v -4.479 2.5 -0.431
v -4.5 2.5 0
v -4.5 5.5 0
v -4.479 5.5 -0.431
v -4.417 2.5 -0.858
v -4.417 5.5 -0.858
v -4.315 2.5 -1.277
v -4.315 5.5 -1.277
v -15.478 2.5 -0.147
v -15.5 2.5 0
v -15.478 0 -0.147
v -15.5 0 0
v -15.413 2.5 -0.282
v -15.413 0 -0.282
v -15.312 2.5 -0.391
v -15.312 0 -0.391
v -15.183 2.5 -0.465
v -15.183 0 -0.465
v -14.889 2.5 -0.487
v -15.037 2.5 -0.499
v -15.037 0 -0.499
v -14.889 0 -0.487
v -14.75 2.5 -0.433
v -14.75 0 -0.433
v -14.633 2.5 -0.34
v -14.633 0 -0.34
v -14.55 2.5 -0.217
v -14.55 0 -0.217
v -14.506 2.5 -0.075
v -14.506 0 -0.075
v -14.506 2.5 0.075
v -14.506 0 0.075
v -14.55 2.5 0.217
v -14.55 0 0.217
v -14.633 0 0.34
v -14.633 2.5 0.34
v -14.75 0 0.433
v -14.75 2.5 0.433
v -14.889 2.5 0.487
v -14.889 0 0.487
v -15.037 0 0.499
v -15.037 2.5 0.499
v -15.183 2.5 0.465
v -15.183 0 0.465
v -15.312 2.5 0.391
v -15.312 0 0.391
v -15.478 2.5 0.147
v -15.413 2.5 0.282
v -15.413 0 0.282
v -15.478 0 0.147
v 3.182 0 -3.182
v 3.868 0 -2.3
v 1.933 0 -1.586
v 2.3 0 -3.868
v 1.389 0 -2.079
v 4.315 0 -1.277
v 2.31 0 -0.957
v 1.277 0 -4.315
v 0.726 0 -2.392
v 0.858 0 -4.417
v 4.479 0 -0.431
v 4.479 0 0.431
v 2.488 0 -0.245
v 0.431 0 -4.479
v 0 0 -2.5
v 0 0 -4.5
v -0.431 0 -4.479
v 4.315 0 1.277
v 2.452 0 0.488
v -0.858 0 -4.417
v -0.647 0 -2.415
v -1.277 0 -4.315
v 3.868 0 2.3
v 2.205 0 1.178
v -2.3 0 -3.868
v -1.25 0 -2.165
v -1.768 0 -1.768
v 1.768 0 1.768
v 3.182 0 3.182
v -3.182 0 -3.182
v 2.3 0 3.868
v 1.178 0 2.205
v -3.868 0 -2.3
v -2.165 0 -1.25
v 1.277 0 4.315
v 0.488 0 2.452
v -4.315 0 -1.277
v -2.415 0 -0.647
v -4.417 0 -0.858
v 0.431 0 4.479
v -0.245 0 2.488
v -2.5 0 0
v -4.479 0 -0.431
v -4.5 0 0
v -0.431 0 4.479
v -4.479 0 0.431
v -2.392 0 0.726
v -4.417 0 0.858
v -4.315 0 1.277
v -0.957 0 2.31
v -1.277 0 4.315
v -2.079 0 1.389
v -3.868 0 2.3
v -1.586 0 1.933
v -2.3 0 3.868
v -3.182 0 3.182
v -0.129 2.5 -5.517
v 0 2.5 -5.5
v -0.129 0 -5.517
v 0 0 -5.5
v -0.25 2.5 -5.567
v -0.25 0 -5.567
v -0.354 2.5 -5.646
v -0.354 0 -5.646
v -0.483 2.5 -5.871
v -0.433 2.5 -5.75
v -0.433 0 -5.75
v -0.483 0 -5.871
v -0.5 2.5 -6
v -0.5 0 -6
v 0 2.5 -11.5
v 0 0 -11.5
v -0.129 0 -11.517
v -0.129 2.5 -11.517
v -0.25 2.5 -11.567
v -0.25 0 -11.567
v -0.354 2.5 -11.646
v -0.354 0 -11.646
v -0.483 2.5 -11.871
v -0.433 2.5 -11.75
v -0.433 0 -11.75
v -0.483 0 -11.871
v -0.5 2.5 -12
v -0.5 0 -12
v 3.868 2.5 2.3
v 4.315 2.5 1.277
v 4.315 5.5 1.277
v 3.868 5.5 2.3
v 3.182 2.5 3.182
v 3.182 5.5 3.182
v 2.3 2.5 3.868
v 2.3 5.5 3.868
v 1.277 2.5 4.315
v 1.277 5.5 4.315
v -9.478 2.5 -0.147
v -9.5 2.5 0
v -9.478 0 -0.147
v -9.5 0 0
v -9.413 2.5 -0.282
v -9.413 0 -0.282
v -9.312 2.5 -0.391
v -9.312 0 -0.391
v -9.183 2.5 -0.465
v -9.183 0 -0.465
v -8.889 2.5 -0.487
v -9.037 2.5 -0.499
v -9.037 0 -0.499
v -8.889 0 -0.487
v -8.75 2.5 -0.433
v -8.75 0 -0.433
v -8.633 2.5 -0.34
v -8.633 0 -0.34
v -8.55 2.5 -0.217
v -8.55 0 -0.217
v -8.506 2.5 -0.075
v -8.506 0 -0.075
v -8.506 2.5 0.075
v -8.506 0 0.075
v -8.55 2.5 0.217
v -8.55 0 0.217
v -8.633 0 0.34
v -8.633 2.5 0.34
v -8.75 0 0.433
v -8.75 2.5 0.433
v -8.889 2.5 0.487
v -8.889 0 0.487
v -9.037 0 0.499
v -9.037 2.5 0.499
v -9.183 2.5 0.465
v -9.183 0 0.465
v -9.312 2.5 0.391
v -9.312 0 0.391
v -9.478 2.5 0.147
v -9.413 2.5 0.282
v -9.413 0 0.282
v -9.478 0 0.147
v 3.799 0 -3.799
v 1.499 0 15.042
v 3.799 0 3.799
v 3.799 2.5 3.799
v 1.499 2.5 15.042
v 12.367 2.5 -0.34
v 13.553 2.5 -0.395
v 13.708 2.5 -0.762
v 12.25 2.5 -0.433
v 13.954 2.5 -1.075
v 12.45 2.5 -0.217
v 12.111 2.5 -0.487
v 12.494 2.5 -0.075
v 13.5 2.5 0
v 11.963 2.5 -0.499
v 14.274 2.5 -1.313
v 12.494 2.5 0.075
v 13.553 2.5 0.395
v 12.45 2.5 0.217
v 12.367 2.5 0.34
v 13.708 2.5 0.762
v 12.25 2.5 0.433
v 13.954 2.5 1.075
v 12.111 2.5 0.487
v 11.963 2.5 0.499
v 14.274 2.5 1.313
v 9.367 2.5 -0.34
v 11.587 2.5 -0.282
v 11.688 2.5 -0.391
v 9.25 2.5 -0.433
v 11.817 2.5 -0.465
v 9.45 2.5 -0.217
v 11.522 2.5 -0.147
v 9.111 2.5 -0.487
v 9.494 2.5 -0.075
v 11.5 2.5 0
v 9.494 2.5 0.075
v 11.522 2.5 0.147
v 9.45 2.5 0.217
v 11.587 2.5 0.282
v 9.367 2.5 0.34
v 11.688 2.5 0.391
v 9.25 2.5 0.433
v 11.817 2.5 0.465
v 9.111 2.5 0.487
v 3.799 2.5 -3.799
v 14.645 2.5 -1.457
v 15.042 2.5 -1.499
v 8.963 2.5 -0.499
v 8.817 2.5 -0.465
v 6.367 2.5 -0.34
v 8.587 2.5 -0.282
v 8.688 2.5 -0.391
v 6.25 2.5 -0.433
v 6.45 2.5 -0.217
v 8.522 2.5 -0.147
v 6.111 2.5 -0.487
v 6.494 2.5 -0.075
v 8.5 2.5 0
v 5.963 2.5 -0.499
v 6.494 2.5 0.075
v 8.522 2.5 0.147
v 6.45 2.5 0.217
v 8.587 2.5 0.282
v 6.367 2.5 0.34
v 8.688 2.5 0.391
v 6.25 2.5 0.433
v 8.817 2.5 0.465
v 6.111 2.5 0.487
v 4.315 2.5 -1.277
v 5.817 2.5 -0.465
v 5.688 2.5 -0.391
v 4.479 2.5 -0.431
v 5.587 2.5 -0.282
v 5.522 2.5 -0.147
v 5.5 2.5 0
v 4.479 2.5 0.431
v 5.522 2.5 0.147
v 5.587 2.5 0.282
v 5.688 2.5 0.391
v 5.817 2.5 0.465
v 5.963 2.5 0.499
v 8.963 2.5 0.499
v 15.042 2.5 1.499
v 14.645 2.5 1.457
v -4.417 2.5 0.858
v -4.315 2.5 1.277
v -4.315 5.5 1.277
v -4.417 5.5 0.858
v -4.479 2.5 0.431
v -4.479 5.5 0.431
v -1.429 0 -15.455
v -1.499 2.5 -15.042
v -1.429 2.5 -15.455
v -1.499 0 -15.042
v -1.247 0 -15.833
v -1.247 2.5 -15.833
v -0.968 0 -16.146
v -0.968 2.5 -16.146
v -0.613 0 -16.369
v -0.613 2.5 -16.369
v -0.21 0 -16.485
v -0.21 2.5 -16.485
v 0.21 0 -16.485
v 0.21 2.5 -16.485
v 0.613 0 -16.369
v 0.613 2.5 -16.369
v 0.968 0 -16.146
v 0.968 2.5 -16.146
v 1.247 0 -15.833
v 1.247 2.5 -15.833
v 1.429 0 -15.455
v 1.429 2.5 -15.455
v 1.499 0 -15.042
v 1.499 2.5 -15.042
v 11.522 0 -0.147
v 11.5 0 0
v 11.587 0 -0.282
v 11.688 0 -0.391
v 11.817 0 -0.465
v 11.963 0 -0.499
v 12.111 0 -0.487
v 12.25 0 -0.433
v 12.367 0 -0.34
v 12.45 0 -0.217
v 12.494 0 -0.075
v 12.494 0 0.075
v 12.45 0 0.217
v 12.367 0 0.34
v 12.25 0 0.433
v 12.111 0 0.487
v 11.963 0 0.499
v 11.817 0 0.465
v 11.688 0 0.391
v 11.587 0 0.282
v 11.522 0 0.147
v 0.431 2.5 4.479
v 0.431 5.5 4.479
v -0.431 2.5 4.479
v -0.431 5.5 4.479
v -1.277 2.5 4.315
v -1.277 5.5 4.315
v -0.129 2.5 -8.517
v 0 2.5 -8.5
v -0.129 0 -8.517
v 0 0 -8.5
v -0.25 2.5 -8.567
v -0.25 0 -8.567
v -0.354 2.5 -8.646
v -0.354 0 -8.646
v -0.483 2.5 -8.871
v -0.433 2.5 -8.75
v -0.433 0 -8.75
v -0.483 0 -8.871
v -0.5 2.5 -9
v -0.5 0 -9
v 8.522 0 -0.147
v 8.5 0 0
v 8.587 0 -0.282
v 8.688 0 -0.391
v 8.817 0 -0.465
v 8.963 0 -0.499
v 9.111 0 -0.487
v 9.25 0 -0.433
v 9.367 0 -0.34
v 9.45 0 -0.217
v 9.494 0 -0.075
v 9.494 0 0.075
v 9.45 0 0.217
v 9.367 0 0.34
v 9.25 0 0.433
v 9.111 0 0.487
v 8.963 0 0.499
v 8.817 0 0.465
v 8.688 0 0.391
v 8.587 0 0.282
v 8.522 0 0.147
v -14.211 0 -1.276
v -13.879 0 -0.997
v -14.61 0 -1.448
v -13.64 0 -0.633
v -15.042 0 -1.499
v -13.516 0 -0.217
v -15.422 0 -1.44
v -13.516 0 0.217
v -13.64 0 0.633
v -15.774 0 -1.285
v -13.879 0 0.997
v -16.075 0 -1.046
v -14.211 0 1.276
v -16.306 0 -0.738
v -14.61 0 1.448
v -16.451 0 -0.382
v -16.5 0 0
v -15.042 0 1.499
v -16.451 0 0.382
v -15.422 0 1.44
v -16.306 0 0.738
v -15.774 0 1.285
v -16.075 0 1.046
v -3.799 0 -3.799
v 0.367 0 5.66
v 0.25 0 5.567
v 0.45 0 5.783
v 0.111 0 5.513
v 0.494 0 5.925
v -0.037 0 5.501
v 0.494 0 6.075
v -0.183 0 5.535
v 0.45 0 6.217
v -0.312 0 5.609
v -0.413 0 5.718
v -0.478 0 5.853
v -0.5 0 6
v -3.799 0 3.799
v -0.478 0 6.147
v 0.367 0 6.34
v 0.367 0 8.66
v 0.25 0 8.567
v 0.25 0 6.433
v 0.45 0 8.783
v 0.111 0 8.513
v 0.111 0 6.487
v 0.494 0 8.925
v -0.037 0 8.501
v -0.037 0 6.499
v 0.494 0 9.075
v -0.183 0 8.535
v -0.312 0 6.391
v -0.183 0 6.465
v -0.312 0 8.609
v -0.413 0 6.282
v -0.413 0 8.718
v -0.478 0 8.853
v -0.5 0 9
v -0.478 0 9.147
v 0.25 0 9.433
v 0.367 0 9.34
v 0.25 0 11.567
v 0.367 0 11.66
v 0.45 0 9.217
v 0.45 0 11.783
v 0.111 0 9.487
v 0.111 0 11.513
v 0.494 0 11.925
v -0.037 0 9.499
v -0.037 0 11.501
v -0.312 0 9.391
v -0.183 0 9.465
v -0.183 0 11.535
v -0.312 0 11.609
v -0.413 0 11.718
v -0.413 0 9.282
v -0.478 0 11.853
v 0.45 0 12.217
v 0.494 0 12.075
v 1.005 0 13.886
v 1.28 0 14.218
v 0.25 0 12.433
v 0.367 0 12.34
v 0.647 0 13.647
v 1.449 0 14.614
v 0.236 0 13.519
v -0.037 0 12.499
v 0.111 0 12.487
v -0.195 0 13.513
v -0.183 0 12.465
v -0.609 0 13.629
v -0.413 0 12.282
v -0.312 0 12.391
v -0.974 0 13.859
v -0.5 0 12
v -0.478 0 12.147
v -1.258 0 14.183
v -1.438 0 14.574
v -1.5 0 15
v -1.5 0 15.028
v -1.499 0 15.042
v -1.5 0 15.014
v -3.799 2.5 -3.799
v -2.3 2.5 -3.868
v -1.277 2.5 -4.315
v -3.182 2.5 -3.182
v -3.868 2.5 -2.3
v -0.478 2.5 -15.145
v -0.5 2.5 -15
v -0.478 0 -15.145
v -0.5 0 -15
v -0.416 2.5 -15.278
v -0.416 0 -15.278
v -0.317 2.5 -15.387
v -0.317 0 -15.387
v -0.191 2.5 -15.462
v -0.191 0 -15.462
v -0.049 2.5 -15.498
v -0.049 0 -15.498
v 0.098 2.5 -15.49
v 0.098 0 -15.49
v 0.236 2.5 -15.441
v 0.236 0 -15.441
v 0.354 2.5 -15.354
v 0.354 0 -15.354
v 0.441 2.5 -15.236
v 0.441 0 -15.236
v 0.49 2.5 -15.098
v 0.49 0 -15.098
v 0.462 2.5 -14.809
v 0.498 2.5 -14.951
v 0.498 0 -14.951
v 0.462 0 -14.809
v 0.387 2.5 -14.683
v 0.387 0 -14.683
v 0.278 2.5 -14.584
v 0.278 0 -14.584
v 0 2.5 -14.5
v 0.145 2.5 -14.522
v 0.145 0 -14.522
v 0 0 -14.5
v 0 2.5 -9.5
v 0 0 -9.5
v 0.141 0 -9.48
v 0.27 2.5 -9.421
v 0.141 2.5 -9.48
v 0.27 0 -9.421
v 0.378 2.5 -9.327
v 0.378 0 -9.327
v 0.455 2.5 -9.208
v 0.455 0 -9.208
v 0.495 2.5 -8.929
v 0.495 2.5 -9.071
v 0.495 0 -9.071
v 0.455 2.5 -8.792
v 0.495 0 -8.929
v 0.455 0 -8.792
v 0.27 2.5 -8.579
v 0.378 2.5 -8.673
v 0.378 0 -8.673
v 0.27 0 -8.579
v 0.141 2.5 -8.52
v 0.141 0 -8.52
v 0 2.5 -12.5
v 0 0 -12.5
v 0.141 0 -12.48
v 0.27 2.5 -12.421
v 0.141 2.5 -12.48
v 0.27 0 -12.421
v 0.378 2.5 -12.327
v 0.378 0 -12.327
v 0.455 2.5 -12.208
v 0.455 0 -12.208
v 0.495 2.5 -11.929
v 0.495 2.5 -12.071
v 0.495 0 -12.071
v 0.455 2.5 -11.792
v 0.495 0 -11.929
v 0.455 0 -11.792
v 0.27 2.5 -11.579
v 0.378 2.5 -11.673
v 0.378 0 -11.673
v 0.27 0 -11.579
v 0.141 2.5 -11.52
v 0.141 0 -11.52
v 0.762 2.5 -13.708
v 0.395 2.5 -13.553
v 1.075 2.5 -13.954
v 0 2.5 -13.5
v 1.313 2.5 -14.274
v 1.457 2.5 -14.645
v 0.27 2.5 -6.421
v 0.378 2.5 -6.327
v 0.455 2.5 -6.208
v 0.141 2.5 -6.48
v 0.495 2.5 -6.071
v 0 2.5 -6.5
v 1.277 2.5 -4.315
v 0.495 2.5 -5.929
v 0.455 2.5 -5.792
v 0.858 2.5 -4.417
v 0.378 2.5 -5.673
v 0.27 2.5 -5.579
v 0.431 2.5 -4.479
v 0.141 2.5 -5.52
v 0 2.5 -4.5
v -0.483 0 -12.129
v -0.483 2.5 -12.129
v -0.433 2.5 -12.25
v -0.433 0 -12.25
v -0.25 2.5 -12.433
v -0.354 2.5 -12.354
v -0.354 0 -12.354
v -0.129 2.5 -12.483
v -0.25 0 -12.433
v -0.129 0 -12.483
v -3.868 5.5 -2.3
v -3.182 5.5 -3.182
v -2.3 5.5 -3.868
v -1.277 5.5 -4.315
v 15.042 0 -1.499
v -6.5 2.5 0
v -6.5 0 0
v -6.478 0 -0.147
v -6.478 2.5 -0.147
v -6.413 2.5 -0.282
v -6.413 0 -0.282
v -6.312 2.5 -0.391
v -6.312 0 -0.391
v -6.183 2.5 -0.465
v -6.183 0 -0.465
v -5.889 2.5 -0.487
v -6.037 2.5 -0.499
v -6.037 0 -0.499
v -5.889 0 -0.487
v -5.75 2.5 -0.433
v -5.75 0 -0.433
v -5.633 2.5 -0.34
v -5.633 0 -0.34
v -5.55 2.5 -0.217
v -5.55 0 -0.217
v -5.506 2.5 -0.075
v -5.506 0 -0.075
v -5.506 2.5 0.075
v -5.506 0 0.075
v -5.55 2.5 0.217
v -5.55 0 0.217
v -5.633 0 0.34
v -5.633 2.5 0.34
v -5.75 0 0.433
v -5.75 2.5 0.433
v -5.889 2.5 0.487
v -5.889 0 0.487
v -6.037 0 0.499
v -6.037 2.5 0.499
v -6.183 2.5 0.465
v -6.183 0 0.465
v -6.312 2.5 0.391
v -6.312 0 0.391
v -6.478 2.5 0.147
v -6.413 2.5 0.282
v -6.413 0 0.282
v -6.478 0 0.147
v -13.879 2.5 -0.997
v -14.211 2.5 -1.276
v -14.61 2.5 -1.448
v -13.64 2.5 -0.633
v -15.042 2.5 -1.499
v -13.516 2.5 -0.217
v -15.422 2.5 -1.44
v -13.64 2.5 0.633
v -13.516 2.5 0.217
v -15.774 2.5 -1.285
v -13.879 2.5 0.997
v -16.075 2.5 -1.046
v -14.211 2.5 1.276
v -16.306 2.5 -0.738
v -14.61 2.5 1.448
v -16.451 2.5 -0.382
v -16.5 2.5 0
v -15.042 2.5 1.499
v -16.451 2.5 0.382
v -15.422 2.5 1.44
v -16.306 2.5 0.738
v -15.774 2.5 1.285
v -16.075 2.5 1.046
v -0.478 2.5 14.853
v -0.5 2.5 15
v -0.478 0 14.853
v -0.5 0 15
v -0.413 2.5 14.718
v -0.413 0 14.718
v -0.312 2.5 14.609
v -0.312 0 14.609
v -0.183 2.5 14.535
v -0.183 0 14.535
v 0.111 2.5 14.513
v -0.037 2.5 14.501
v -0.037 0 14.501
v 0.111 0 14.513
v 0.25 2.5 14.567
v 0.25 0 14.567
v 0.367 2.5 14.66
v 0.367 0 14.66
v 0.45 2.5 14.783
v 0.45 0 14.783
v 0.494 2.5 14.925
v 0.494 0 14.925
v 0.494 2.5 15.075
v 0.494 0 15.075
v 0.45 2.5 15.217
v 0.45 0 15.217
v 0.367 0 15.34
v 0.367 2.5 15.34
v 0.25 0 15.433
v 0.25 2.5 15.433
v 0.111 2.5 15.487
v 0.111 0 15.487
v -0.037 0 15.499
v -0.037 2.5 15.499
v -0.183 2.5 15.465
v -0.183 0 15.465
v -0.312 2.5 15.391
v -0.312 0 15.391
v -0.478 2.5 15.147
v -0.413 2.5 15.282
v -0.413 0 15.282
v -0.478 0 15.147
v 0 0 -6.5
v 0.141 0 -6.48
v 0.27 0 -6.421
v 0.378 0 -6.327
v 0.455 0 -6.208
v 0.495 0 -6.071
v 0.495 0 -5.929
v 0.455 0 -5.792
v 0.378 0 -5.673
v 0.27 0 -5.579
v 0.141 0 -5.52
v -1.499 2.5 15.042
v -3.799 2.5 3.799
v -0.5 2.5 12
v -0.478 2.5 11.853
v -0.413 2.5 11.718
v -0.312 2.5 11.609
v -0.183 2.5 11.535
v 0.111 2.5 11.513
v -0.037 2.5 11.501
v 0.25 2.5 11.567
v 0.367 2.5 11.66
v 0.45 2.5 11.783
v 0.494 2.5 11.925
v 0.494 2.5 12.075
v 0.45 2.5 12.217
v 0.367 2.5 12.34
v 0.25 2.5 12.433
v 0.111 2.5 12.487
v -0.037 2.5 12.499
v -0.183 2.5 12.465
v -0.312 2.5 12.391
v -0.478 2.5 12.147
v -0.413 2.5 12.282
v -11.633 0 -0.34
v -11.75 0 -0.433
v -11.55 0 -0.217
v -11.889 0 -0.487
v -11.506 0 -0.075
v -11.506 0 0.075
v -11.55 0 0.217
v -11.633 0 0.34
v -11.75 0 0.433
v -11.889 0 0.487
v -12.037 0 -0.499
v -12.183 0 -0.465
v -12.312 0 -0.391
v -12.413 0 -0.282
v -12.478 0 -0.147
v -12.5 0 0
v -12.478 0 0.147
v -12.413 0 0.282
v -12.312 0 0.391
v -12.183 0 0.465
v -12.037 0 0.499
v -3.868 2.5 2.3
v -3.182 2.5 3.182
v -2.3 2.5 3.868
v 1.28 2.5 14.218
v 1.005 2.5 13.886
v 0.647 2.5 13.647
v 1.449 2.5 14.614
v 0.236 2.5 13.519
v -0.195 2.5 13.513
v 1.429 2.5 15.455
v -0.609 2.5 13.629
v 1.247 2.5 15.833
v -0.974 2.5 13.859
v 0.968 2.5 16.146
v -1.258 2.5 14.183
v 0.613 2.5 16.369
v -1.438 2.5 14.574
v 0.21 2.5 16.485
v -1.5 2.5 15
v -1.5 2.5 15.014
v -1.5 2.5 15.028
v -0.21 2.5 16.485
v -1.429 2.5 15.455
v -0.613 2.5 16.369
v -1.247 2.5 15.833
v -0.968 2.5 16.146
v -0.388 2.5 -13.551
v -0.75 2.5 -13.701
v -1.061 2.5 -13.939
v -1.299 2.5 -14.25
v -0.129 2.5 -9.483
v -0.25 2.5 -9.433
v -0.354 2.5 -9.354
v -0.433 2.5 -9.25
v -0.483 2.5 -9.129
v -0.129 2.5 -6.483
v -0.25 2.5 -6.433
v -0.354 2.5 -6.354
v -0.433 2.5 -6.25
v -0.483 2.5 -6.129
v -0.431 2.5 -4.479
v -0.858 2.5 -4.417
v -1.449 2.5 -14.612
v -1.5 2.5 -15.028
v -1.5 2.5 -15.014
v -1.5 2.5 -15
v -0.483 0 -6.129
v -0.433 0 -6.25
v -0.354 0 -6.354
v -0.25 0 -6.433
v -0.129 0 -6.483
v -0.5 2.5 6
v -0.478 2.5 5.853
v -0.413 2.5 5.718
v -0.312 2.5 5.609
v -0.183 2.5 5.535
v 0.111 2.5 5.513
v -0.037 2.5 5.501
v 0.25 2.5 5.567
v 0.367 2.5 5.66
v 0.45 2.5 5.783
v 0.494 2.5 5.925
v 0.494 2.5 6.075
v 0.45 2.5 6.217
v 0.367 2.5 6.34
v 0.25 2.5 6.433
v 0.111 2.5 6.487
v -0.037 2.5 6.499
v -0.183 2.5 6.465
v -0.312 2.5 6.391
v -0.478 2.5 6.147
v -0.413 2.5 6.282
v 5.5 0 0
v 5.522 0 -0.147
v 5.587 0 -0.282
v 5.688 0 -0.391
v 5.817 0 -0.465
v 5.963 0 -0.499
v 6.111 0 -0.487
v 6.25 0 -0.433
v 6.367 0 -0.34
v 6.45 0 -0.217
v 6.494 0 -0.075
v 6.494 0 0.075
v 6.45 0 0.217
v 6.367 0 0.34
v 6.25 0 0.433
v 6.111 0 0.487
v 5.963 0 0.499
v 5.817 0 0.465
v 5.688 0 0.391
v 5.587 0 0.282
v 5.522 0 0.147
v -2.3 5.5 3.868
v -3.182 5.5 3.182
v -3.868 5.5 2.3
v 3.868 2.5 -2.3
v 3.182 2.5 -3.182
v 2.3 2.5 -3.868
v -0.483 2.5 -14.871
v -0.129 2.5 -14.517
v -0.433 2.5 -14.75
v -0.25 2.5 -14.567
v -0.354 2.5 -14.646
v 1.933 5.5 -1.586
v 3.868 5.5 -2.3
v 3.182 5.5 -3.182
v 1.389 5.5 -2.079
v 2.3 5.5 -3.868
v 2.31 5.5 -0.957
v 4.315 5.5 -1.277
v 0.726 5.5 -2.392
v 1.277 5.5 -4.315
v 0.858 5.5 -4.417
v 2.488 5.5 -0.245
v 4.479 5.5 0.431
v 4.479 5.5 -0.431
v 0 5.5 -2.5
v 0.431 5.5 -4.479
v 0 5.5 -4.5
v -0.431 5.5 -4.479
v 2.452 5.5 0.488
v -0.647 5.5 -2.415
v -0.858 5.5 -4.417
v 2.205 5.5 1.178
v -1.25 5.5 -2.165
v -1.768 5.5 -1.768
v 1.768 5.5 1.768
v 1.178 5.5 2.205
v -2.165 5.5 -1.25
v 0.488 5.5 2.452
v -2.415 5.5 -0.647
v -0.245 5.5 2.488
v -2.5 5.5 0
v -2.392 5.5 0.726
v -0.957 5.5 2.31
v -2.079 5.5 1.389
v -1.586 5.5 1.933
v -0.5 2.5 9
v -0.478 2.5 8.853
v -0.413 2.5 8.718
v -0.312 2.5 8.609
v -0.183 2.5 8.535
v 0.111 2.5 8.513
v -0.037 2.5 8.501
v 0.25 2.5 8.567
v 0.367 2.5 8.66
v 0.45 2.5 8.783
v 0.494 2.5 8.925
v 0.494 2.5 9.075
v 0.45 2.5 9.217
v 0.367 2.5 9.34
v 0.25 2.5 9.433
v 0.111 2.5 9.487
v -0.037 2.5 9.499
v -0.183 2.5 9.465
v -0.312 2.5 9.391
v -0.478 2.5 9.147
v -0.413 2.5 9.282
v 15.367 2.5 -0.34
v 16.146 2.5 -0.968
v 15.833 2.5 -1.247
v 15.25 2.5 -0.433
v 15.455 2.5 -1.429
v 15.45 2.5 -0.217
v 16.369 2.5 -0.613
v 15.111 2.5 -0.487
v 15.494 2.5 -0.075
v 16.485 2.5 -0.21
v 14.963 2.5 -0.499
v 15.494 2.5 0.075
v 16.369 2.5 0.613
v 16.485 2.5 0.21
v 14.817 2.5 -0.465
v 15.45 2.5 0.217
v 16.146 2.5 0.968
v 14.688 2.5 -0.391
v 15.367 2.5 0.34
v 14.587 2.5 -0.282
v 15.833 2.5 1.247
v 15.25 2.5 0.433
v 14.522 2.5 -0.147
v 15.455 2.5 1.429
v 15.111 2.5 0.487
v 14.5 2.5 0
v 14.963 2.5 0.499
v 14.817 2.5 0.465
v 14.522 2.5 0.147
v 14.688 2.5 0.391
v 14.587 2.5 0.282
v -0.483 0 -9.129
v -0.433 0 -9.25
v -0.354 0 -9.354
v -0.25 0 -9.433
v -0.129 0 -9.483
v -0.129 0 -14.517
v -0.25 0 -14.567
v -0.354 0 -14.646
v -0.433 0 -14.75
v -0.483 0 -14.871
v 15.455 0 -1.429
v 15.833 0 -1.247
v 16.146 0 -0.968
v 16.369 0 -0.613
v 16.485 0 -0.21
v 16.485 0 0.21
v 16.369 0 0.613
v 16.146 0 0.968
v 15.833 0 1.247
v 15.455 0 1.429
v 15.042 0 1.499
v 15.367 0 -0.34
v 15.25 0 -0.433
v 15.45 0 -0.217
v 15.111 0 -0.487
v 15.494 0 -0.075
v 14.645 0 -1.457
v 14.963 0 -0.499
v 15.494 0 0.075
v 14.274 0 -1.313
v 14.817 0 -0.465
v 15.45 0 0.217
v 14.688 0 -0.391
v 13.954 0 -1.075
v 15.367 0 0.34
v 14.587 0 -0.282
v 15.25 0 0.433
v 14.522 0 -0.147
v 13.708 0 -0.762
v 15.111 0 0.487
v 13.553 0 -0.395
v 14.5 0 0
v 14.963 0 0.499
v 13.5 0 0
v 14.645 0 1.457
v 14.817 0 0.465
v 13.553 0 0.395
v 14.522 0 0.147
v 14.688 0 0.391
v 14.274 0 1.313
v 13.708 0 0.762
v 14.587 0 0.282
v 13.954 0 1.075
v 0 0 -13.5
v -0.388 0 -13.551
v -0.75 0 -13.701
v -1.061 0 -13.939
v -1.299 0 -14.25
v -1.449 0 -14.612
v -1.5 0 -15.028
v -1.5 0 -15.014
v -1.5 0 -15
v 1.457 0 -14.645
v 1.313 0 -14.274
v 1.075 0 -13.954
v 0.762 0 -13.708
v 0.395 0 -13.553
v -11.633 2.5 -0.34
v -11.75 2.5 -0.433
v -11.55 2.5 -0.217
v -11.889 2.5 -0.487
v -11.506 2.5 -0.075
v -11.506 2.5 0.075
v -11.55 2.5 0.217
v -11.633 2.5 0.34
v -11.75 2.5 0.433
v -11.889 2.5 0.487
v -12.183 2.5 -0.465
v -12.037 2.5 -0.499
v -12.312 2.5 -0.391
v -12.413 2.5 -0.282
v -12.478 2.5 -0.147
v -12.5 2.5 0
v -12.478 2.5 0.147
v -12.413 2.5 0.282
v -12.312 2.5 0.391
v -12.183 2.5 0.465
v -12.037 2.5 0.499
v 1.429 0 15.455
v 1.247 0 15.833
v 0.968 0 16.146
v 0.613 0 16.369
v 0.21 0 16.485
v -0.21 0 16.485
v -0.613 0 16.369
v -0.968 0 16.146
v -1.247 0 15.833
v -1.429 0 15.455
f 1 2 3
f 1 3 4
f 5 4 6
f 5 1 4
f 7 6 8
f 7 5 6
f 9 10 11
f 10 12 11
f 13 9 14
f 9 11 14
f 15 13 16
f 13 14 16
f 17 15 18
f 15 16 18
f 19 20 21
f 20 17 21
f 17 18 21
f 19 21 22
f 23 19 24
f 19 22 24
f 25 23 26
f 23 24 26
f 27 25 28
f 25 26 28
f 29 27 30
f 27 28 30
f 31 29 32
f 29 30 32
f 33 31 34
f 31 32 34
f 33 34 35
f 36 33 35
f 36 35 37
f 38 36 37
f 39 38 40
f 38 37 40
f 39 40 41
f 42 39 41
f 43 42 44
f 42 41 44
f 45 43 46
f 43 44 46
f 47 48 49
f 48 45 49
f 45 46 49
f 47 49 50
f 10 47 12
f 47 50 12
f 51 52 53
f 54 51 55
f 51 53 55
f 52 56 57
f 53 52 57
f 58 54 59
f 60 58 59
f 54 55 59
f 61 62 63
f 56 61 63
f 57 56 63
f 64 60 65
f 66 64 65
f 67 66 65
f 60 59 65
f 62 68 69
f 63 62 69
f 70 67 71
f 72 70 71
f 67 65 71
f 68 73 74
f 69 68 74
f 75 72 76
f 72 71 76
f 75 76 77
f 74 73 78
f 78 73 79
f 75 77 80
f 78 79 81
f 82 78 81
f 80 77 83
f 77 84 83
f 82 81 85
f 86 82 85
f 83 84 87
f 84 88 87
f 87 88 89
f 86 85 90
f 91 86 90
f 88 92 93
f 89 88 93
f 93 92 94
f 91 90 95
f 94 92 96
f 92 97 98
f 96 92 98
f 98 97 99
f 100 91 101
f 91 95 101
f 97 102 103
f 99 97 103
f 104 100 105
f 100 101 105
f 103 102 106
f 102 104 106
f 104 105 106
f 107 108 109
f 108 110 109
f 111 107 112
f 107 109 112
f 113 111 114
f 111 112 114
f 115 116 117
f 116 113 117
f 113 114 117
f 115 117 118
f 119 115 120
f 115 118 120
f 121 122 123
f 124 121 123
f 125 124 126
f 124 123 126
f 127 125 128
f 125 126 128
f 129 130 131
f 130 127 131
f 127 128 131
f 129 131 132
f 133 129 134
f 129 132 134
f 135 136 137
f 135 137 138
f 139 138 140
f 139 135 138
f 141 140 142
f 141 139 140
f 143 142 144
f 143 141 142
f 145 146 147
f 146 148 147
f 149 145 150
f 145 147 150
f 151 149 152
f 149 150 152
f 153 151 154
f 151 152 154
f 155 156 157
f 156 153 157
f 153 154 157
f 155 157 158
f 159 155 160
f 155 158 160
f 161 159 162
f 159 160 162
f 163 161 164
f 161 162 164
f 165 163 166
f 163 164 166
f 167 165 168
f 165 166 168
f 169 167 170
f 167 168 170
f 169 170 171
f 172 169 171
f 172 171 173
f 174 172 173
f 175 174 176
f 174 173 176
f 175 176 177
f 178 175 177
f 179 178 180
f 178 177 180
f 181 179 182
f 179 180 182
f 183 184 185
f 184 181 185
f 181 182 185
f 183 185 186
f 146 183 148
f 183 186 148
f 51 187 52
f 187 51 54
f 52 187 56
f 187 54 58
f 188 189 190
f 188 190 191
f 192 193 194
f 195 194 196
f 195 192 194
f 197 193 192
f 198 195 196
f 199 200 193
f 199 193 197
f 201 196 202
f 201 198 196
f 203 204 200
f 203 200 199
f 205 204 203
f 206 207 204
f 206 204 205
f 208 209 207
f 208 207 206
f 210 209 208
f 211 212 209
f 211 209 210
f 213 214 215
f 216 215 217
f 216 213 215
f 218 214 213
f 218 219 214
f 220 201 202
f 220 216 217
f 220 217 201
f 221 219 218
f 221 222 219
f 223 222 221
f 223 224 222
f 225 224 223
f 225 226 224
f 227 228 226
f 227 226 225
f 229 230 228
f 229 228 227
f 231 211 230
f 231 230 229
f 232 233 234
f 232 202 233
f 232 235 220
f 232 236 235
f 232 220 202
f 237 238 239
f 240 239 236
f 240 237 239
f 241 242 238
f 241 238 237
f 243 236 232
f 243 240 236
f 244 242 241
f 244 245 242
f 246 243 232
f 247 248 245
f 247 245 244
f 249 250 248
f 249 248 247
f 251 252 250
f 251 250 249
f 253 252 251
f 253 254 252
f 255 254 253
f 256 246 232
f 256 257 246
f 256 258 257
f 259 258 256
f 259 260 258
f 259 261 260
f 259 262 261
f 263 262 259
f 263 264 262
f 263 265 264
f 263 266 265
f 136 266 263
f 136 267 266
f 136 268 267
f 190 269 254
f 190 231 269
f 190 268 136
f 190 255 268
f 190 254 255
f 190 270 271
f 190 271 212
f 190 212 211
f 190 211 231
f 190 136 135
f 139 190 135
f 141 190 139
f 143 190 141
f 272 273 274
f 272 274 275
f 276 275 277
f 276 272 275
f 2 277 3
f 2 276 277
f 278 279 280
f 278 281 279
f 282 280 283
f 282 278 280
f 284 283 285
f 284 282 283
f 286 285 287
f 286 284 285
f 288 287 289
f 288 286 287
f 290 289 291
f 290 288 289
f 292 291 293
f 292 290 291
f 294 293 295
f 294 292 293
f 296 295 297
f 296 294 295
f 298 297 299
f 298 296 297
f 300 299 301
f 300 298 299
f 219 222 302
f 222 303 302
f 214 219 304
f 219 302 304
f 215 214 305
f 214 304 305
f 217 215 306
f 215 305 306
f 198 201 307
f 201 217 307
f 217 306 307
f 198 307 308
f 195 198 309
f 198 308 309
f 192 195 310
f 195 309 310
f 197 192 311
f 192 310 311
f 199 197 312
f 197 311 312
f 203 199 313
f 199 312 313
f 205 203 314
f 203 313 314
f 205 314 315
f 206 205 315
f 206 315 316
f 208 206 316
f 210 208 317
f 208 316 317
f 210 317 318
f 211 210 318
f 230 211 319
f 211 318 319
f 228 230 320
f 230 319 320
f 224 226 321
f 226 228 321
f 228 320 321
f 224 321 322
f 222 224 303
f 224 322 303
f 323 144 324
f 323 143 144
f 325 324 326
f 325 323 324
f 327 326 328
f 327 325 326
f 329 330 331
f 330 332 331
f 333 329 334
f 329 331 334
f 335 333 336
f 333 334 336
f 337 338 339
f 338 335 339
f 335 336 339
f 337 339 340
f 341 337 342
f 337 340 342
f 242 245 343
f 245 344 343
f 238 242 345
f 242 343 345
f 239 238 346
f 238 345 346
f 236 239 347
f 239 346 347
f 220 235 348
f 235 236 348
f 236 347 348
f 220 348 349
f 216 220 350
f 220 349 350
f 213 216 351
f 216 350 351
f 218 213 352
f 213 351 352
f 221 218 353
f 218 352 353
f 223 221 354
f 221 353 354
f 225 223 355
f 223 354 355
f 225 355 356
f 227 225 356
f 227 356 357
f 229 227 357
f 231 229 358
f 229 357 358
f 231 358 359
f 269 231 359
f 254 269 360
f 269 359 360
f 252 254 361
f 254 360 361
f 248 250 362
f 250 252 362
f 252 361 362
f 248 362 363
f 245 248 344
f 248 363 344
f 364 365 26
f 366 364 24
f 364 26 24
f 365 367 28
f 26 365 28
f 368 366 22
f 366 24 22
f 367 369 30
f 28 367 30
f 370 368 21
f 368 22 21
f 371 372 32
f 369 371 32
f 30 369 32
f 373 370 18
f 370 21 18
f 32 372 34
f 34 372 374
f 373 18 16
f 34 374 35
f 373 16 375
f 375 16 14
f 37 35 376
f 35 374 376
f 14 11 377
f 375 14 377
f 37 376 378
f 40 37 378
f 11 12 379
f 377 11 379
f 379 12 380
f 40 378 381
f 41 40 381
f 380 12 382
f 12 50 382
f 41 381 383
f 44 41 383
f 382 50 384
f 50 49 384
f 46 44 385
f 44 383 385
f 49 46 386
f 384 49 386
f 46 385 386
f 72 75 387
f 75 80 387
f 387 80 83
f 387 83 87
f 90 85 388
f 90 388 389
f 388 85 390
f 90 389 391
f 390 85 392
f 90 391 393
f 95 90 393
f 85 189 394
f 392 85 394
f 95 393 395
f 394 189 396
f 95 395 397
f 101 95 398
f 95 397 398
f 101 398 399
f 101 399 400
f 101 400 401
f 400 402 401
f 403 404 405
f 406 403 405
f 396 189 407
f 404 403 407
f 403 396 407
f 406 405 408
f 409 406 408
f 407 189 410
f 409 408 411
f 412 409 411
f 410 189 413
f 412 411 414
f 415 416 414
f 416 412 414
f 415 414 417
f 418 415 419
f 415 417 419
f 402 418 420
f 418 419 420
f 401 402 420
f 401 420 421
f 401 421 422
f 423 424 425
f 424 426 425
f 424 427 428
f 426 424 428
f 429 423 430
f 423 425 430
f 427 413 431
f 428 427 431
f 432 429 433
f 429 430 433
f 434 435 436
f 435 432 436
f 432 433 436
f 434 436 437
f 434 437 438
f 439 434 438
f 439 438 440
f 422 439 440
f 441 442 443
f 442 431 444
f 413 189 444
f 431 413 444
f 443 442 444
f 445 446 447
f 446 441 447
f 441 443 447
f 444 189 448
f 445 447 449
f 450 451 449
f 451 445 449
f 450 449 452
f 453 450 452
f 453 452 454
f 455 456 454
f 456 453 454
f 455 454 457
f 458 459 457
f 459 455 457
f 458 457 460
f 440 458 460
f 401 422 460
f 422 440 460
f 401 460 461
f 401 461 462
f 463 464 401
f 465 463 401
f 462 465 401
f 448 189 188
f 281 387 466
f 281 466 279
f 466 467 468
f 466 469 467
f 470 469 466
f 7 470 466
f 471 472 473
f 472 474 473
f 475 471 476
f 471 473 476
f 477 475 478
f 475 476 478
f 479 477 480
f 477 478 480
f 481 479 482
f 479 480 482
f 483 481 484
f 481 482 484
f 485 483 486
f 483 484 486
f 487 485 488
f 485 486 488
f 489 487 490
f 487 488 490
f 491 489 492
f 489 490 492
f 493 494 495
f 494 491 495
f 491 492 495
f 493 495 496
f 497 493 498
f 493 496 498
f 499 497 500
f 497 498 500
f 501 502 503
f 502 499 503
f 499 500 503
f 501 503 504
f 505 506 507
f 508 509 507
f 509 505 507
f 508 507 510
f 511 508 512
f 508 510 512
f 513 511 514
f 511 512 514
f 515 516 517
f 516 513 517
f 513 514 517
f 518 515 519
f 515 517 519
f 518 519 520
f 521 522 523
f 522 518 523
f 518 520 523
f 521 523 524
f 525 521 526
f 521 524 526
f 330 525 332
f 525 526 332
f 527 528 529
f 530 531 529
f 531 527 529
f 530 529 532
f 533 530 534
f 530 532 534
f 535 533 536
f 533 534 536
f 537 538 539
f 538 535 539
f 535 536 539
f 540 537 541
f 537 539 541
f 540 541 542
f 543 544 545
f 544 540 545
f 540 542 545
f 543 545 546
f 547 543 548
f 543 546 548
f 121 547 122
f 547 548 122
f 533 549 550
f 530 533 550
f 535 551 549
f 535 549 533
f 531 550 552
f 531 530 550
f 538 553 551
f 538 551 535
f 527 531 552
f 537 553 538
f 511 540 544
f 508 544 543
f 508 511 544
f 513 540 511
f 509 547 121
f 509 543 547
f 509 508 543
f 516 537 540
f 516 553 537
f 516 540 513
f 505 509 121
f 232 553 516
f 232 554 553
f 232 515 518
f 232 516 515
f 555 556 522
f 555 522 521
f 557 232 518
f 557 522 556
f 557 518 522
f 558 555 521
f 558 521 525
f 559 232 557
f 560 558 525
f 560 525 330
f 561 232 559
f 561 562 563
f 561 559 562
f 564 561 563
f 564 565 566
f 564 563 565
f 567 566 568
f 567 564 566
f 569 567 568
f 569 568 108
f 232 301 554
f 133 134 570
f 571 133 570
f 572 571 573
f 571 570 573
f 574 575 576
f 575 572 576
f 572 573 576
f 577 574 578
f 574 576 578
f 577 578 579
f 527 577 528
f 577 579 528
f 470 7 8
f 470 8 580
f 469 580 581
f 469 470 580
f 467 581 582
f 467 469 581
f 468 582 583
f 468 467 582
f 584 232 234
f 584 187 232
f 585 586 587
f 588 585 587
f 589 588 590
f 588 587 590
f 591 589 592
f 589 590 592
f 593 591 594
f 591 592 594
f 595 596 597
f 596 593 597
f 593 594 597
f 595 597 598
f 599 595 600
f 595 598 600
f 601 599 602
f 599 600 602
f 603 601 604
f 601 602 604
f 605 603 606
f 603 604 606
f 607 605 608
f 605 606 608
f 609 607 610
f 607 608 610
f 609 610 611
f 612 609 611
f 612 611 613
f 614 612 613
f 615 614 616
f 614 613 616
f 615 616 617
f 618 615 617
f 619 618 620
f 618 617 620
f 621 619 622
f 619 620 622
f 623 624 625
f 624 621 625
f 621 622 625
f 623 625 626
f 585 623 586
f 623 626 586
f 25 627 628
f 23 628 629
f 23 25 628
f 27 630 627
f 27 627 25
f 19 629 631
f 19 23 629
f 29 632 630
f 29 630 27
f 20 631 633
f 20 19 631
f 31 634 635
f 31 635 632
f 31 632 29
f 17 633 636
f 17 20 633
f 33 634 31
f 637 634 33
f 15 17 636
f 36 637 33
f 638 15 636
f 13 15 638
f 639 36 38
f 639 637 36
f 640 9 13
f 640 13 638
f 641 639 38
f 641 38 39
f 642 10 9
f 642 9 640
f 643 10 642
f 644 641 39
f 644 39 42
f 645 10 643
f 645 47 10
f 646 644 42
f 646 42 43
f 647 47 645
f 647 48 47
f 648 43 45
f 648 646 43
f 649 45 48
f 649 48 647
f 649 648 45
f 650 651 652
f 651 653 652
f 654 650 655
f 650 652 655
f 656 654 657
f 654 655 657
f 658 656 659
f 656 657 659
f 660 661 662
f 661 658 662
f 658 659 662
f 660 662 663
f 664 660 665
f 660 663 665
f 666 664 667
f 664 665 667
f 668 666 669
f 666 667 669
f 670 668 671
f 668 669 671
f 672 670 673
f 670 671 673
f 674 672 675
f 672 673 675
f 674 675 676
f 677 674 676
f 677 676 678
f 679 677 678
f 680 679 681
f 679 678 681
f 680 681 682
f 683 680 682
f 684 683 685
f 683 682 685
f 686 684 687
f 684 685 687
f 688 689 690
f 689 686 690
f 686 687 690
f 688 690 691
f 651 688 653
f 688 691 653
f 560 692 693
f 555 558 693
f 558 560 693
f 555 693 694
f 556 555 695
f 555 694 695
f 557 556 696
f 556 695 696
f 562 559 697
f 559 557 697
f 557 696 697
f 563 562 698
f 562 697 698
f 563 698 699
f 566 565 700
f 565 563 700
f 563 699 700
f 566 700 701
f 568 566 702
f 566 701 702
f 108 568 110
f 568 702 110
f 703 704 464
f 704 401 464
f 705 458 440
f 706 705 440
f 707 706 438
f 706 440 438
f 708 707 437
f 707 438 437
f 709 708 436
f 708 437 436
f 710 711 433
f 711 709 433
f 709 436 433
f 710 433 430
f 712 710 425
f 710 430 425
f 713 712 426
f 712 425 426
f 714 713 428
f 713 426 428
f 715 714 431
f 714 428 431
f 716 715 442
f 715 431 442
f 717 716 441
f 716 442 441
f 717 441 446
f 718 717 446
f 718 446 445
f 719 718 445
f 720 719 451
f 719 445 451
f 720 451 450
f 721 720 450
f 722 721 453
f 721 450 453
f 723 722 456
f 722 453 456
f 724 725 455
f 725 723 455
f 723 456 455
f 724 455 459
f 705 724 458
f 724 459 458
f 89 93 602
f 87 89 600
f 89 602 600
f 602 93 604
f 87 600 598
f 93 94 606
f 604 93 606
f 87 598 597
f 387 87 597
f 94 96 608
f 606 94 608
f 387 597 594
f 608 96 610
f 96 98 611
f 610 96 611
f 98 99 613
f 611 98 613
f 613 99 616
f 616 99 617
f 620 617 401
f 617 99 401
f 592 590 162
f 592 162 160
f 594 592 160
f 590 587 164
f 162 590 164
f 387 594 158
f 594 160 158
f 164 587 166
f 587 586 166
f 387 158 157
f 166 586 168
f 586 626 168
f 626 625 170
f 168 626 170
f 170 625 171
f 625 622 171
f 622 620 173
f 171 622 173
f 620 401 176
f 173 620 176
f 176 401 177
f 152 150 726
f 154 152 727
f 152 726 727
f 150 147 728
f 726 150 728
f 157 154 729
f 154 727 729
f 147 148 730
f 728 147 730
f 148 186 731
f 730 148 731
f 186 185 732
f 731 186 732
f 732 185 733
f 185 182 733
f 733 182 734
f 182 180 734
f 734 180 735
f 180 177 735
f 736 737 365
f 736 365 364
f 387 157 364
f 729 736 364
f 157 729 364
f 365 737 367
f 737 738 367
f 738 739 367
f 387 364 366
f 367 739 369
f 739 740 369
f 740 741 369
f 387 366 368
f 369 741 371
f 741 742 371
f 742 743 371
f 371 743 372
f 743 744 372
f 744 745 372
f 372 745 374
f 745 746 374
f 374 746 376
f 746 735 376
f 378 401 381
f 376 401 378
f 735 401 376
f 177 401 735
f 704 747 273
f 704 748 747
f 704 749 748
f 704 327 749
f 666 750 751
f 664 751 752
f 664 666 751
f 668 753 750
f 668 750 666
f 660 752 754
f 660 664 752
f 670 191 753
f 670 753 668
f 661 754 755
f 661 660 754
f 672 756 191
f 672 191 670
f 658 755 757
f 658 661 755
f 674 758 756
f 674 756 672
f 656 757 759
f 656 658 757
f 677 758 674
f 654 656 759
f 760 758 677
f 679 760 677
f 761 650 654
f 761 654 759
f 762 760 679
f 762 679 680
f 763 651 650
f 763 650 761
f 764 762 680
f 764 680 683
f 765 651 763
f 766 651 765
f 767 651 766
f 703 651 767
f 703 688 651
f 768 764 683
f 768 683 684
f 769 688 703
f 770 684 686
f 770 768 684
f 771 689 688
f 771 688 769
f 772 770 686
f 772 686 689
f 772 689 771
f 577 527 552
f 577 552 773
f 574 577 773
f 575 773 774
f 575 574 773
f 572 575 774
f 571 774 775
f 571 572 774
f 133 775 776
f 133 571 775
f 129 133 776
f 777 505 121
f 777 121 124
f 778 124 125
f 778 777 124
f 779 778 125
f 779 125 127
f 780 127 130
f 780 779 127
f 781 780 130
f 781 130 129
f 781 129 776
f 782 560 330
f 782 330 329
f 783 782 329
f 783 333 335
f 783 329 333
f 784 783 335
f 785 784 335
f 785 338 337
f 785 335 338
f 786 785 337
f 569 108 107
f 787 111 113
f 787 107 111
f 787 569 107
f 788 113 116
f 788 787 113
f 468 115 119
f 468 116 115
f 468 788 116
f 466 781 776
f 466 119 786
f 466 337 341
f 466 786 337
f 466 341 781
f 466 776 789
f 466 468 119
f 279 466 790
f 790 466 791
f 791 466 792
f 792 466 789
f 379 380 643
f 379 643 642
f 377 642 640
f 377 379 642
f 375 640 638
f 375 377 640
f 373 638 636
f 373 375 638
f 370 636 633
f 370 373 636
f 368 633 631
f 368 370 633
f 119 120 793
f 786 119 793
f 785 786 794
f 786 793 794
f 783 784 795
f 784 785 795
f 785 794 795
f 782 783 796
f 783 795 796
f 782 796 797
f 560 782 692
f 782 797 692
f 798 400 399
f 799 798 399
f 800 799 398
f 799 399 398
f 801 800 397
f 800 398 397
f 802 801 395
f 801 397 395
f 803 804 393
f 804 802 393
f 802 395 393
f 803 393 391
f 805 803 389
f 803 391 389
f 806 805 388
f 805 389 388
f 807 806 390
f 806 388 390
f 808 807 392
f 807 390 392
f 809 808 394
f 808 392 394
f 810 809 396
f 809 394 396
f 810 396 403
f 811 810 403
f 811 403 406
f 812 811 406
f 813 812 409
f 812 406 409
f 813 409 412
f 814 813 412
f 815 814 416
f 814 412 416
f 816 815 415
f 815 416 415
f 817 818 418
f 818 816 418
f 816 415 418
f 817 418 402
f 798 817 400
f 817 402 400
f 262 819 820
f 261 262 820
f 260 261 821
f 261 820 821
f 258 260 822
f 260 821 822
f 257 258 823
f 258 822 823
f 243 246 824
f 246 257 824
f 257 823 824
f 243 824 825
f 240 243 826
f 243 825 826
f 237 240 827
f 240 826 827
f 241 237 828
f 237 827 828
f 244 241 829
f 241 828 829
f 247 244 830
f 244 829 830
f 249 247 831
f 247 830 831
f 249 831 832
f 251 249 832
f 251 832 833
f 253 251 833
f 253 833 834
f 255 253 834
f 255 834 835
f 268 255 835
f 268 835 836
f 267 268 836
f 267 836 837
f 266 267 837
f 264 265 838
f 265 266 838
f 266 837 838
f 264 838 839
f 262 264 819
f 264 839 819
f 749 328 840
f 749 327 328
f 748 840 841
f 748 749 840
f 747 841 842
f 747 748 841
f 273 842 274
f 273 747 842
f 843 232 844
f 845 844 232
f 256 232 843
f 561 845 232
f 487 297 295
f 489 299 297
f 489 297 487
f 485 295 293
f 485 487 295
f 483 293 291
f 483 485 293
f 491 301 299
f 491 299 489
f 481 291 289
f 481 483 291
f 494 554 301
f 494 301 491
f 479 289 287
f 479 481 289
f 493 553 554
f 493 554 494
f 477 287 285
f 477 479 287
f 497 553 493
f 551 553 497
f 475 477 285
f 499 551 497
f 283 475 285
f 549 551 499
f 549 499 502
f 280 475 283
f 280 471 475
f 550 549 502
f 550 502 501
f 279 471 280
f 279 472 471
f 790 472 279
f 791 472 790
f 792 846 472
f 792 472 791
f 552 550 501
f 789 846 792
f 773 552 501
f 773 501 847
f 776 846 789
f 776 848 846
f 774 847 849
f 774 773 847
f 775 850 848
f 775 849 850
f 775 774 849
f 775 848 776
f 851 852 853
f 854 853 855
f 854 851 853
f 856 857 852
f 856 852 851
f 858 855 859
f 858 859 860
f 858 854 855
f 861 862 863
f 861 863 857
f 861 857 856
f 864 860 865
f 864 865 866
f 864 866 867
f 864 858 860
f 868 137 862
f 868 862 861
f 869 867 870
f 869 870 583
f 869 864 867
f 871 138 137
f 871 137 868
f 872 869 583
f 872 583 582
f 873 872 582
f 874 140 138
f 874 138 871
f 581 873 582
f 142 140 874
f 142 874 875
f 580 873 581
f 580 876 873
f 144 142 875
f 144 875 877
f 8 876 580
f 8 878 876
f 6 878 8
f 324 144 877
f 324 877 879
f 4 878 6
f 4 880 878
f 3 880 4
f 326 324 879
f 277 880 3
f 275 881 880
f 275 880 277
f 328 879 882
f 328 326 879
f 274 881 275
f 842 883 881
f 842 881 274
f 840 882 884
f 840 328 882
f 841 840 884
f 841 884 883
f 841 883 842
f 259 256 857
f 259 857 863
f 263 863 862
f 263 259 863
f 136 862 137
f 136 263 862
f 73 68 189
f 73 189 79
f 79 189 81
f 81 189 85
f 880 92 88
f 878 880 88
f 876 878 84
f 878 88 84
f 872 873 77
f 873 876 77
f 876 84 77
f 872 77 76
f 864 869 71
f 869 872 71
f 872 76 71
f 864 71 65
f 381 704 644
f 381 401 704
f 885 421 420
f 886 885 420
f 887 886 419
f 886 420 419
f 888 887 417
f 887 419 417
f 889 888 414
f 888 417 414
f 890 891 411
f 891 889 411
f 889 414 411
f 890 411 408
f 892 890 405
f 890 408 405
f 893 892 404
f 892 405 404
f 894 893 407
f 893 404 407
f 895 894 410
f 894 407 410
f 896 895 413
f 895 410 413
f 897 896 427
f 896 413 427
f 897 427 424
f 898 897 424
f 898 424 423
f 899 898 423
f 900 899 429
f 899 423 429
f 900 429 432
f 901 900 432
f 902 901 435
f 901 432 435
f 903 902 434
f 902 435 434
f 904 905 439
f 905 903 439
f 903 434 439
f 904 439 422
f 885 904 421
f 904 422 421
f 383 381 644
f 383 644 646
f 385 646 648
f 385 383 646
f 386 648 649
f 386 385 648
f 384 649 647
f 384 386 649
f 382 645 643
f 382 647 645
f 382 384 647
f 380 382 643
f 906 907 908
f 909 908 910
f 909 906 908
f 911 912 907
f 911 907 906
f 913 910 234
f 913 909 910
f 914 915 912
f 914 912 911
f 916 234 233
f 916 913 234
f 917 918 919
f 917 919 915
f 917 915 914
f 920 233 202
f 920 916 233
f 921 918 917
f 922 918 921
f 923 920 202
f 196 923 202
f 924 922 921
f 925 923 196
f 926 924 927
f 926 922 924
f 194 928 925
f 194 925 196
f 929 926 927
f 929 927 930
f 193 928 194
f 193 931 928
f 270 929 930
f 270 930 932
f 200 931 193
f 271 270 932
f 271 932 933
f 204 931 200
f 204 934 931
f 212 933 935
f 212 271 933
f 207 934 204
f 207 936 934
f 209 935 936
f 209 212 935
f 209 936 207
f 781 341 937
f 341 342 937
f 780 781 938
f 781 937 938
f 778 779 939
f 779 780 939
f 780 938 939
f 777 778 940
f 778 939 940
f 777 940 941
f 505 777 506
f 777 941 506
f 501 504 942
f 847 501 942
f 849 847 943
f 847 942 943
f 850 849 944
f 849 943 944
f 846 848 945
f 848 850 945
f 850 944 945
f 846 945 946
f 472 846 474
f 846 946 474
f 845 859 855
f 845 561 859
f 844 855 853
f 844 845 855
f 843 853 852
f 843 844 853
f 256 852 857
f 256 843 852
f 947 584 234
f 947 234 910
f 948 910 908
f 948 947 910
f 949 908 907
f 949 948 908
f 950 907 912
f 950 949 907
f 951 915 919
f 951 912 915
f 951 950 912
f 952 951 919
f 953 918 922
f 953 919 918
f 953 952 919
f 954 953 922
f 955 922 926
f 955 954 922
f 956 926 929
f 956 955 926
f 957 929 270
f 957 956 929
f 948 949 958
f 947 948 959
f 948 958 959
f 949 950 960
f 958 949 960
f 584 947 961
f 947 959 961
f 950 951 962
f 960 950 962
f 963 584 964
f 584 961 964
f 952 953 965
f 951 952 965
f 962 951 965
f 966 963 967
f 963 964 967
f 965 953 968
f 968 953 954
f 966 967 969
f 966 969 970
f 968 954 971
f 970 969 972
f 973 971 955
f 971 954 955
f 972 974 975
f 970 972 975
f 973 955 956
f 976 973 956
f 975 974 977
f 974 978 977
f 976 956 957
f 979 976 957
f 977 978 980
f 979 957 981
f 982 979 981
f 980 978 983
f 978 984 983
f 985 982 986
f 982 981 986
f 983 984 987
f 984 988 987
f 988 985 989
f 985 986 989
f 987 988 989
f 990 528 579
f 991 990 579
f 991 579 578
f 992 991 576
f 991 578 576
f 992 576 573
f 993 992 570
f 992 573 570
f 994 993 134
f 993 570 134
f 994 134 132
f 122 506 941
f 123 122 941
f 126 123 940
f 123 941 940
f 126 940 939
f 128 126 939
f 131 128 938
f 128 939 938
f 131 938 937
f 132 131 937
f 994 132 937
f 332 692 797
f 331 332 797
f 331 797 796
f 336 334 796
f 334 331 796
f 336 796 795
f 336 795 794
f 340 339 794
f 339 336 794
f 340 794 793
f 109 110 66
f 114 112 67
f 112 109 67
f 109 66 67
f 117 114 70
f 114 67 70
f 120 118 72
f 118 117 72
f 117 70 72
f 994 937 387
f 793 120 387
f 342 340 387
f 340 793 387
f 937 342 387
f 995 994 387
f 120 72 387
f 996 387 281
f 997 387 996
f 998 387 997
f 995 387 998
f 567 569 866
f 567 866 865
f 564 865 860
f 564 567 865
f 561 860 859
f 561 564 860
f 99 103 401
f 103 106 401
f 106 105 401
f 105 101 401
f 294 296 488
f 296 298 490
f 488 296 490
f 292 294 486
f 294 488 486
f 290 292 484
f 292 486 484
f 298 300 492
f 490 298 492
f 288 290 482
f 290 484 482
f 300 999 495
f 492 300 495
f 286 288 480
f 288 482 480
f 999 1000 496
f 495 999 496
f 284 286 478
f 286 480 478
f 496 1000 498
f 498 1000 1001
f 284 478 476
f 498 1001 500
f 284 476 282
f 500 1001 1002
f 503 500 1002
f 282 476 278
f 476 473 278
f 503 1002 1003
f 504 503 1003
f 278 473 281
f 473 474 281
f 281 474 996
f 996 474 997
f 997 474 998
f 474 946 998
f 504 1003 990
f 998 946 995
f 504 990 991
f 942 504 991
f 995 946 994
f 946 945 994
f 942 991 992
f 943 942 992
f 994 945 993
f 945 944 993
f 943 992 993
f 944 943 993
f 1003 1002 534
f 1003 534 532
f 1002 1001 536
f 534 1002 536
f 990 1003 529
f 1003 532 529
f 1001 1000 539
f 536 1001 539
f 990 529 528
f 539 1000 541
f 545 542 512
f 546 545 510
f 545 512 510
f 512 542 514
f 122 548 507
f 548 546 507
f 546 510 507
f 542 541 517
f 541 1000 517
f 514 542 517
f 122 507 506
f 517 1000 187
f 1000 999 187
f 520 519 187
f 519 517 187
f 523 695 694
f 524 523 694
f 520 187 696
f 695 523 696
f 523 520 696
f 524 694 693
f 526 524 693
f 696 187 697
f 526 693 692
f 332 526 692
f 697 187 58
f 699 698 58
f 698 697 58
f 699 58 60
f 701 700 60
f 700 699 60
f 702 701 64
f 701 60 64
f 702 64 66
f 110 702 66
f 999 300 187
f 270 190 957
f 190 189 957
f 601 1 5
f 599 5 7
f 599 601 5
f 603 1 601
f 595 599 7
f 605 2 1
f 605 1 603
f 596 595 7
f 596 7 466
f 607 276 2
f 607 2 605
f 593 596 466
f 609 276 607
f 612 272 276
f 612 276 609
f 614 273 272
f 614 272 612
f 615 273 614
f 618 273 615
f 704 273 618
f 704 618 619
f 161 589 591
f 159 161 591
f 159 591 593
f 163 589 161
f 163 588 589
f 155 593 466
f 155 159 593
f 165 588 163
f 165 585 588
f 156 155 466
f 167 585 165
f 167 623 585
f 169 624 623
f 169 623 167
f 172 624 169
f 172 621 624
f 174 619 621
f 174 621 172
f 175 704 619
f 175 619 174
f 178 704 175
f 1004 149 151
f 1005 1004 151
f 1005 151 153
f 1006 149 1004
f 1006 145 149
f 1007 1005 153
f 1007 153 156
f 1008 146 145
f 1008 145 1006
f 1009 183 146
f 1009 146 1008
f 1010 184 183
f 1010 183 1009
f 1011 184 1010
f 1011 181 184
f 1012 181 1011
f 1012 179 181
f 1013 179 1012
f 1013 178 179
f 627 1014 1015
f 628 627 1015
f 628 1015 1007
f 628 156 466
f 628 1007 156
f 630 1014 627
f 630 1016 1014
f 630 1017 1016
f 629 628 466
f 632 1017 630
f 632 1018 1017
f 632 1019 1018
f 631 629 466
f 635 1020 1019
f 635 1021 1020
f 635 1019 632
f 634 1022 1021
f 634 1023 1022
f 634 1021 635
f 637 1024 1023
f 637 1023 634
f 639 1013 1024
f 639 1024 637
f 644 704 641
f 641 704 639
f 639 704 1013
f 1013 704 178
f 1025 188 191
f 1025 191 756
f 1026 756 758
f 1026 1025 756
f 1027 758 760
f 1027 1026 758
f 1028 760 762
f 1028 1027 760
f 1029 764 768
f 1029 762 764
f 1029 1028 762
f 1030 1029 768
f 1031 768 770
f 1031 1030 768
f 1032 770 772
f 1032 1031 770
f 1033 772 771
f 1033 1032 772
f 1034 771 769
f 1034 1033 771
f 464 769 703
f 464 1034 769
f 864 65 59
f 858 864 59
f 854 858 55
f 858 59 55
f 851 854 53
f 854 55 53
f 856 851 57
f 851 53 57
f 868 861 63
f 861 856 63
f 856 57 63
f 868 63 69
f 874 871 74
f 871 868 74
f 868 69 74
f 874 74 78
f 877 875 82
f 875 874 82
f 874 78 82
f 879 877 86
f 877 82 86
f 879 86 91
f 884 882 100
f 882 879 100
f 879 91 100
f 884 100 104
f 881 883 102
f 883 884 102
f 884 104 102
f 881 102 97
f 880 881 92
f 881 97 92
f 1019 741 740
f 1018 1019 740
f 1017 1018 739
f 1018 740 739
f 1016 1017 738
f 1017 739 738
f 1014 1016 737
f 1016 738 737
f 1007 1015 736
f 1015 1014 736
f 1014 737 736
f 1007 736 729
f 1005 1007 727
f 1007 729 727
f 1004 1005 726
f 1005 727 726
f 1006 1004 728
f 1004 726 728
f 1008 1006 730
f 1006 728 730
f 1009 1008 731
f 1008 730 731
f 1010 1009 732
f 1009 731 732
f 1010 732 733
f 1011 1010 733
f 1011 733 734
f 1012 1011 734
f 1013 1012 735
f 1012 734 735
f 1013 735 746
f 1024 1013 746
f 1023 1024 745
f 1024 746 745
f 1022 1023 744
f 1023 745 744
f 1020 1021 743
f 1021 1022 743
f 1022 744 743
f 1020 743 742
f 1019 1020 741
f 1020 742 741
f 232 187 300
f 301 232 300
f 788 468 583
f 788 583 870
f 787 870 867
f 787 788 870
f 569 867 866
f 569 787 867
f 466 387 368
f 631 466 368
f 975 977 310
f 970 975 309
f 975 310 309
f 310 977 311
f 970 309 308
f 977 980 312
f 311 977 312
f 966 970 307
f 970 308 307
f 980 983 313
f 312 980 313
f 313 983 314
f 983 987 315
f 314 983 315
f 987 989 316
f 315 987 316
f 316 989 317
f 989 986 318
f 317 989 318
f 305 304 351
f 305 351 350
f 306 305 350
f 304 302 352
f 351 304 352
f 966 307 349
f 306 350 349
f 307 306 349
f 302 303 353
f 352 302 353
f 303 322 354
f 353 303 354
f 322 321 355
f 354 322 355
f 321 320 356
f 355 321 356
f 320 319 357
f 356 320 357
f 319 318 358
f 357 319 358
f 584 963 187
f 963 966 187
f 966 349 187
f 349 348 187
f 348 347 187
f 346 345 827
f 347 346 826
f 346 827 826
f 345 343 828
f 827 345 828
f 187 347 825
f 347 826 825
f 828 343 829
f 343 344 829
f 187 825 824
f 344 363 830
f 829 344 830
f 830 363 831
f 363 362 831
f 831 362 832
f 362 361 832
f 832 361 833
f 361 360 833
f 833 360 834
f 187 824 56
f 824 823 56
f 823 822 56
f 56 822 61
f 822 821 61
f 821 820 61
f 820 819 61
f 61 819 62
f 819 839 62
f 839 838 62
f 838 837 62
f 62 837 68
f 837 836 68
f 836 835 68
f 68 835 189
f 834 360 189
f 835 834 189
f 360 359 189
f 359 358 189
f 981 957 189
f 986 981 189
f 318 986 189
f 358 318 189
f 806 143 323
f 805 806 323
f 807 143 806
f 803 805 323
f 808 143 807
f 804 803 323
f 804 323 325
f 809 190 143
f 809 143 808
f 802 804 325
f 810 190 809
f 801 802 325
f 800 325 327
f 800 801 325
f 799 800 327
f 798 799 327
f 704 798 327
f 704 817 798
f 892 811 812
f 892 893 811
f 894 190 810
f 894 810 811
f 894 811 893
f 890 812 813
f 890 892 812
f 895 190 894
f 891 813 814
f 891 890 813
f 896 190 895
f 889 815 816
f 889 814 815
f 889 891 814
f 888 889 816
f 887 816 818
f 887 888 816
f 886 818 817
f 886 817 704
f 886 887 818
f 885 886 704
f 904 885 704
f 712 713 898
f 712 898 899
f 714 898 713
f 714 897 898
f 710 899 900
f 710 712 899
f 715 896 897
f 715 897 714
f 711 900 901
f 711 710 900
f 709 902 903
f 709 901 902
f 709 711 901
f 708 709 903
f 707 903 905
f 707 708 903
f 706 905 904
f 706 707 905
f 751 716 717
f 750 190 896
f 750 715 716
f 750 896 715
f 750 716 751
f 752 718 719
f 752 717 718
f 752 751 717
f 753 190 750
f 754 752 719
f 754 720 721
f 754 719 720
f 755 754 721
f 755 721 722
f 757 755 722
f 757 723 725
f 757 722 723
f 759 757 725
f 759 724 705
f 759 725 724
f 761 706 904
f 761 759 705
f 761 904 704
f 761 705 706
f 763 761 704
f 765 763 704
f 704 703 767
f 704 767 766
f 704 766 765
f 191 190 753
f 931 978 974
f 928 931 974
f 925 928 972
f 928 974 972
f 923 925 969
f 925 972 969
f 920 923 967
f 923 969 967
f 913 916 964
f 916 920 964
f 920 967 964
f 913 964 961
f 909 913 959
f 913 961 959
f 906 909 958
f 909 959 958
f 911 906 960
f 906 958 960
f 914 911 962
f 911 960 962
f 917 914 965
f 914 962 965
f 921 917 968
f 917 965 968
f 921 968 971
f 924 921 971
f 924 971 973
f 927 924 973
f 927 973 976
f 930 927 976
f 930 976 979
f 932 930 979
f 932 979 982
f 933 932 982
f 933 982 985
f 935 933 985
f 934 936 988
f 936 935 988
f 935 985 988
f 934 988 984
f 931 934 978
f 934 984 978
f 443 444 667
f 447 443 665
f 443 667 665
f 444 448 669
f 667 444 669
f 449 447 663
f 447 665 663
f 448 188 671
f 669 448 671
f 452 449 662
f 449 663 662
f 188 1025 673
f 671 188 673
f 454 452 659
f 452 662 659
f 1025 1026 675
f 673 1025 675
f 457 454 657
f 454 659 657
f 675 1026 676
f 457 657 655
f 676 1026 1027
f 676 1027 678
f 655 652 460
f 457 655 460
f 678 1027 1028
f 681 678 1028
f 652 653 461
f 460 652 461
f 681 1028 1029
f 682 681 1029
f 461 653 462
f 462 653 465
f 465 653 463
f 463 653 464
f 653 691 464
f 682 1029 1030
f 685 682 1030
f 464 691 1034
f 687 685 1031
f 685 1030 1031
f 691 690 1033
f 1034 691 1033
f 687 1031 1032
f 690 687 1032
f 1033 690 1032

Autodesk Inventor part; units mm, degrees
ref_plane "YZ Plane" through (0, 0, 0) normal (1, 0, 0) x (0, 1, 0)
ref_plane "XZ Plane" through (0, 0, 0) normal (0, 1, 0) x (-1, 0, 0)
ref_plane "XY Plane" through (0, 0, 0) normal (0, 0, 1) x (1, 0, 0)
sketch "Sketch1" plane through (0, 0, 0) normal (0, 1, 0) x (-1, 0, 0)
  circle A0 centre (0, 0) radius 4.5
  line L0 (0, 0) -> (0, -15)
  circle A1 centre (0, -15) radius 0.5
  circle A2 centre (0, -15) radius 1.5
  line L1 (4.3151, -1.2768) -> (1.4994, -15.0417)
  line L2 (-4.3151, -1.2768) -> (-1.4994, -15.0417)
  circle A3 centre (0, -6) radius 0.5
  circle A4 centre (0, -9) radius 0.5
  circle A5 centre (0, -12) radius 0.5
  line L3 (0, 0) -> (-1.4994, 0)
  circle A6 centre (0, 15) radius 0.5
  circle A7 centre (0, 15) radius 1.5
  line L4 (4.3151, 1.2768) -> (1.4994, 15.0417)
  line L5 (-4.3151, 1.2768) -> (-1.4994, 15.0417)
  circle A8 centre (0, 6) radius 0.5
  circle A9 centre (0, 9) radius 0.5
  circle A10 centre (0, 12) radius 0.5
  circle A11 centre (0, 0) radius 2.5
  circle A12 centre (-6, 0) radius 0.5
  circle A13 centre (-9, 0) radius 0.5
  circle A14 centre (-12, 0) radius 0.5
  circle A15 centre (-15, 0) radius 0.5
  circle A16 centre (-15, 0) radius 1.5
  line L6 (-1.2768, -4.3151) -> (-15.0417, -1.4994)
  line L7 (-1.2768, 4.3151) -> (-15.0417, 1.4994)
  circle A17 centre (0, 6) radius 0.5
  circle A18 centre (0, 9) radius 0.5
  circle A19 centre (0, 12) radius 0.5
  circle A20 centre (0, 15) radius 0.5
  circle A21 centre (0, 15) radius 1.5
  line L8 (-4.3151, 1.2768) -> (-1.4994, 15.0417)
  line L9 (4.3151, 1.2768) -> (1.4994, 15.0417)
  circle A22 centre (6, 0) radius 0.5
  circle A23 centre (9, 0) radius 0.5
  circle A24 centre (12, 0) radius 0.5
  circle A25 centre (15, 0) radius 0.5
  circle A26 centre (15, 0) radius 1.5
  line L10 (1.2768, 4.3151) -> (15.0417, 1.4994)
  line L11 (1.2768, -4.3151) -> (15.0417, -1.4994)
  point P0 (3.7991, -3.7991)
  point P1 (3.7991, 3.7991)
  point P2 (-3.7991, 3.7991)
  point P3 (-15.0417, 1.4994)
  point P4 (-3.7991, -3.7991)
  dimension "d0" = 9
  dimension "d3" = 3
  dimension "d1" = 15
  dimension "d2" = 1
  dimension "d4" = 1
  dimension "d5" = 1
  dimension "d6" = 1
  dimension "d8" = 3
  dimension "d9" = 3
  dimension "d10" = 3
  dimension "d13" = 5
  dimension "d18" = 360
extrude "Extrusion1" add sketch "Sketch1" along normal blind 2.5 contours A0 L4 L10 A26 L11 L1 | A0 L10 L4 | L1 L11 A0 | A0 L7 L5 A7 L4 L10 | L11 L1 A2 L0 A5 A4 A3 A0 | A0 L5 L7 | A7 | A26 | L0 A3 A4 A5 A2 L2 L6 A0 | A2 | A0 L2 L6 A16 L7 L5 | L6 L2 A0 | A16
extrude "Extrusion2" add sketch "Sketch1" along normal blind 5.5 contours A0
properties part number "90Horn"
